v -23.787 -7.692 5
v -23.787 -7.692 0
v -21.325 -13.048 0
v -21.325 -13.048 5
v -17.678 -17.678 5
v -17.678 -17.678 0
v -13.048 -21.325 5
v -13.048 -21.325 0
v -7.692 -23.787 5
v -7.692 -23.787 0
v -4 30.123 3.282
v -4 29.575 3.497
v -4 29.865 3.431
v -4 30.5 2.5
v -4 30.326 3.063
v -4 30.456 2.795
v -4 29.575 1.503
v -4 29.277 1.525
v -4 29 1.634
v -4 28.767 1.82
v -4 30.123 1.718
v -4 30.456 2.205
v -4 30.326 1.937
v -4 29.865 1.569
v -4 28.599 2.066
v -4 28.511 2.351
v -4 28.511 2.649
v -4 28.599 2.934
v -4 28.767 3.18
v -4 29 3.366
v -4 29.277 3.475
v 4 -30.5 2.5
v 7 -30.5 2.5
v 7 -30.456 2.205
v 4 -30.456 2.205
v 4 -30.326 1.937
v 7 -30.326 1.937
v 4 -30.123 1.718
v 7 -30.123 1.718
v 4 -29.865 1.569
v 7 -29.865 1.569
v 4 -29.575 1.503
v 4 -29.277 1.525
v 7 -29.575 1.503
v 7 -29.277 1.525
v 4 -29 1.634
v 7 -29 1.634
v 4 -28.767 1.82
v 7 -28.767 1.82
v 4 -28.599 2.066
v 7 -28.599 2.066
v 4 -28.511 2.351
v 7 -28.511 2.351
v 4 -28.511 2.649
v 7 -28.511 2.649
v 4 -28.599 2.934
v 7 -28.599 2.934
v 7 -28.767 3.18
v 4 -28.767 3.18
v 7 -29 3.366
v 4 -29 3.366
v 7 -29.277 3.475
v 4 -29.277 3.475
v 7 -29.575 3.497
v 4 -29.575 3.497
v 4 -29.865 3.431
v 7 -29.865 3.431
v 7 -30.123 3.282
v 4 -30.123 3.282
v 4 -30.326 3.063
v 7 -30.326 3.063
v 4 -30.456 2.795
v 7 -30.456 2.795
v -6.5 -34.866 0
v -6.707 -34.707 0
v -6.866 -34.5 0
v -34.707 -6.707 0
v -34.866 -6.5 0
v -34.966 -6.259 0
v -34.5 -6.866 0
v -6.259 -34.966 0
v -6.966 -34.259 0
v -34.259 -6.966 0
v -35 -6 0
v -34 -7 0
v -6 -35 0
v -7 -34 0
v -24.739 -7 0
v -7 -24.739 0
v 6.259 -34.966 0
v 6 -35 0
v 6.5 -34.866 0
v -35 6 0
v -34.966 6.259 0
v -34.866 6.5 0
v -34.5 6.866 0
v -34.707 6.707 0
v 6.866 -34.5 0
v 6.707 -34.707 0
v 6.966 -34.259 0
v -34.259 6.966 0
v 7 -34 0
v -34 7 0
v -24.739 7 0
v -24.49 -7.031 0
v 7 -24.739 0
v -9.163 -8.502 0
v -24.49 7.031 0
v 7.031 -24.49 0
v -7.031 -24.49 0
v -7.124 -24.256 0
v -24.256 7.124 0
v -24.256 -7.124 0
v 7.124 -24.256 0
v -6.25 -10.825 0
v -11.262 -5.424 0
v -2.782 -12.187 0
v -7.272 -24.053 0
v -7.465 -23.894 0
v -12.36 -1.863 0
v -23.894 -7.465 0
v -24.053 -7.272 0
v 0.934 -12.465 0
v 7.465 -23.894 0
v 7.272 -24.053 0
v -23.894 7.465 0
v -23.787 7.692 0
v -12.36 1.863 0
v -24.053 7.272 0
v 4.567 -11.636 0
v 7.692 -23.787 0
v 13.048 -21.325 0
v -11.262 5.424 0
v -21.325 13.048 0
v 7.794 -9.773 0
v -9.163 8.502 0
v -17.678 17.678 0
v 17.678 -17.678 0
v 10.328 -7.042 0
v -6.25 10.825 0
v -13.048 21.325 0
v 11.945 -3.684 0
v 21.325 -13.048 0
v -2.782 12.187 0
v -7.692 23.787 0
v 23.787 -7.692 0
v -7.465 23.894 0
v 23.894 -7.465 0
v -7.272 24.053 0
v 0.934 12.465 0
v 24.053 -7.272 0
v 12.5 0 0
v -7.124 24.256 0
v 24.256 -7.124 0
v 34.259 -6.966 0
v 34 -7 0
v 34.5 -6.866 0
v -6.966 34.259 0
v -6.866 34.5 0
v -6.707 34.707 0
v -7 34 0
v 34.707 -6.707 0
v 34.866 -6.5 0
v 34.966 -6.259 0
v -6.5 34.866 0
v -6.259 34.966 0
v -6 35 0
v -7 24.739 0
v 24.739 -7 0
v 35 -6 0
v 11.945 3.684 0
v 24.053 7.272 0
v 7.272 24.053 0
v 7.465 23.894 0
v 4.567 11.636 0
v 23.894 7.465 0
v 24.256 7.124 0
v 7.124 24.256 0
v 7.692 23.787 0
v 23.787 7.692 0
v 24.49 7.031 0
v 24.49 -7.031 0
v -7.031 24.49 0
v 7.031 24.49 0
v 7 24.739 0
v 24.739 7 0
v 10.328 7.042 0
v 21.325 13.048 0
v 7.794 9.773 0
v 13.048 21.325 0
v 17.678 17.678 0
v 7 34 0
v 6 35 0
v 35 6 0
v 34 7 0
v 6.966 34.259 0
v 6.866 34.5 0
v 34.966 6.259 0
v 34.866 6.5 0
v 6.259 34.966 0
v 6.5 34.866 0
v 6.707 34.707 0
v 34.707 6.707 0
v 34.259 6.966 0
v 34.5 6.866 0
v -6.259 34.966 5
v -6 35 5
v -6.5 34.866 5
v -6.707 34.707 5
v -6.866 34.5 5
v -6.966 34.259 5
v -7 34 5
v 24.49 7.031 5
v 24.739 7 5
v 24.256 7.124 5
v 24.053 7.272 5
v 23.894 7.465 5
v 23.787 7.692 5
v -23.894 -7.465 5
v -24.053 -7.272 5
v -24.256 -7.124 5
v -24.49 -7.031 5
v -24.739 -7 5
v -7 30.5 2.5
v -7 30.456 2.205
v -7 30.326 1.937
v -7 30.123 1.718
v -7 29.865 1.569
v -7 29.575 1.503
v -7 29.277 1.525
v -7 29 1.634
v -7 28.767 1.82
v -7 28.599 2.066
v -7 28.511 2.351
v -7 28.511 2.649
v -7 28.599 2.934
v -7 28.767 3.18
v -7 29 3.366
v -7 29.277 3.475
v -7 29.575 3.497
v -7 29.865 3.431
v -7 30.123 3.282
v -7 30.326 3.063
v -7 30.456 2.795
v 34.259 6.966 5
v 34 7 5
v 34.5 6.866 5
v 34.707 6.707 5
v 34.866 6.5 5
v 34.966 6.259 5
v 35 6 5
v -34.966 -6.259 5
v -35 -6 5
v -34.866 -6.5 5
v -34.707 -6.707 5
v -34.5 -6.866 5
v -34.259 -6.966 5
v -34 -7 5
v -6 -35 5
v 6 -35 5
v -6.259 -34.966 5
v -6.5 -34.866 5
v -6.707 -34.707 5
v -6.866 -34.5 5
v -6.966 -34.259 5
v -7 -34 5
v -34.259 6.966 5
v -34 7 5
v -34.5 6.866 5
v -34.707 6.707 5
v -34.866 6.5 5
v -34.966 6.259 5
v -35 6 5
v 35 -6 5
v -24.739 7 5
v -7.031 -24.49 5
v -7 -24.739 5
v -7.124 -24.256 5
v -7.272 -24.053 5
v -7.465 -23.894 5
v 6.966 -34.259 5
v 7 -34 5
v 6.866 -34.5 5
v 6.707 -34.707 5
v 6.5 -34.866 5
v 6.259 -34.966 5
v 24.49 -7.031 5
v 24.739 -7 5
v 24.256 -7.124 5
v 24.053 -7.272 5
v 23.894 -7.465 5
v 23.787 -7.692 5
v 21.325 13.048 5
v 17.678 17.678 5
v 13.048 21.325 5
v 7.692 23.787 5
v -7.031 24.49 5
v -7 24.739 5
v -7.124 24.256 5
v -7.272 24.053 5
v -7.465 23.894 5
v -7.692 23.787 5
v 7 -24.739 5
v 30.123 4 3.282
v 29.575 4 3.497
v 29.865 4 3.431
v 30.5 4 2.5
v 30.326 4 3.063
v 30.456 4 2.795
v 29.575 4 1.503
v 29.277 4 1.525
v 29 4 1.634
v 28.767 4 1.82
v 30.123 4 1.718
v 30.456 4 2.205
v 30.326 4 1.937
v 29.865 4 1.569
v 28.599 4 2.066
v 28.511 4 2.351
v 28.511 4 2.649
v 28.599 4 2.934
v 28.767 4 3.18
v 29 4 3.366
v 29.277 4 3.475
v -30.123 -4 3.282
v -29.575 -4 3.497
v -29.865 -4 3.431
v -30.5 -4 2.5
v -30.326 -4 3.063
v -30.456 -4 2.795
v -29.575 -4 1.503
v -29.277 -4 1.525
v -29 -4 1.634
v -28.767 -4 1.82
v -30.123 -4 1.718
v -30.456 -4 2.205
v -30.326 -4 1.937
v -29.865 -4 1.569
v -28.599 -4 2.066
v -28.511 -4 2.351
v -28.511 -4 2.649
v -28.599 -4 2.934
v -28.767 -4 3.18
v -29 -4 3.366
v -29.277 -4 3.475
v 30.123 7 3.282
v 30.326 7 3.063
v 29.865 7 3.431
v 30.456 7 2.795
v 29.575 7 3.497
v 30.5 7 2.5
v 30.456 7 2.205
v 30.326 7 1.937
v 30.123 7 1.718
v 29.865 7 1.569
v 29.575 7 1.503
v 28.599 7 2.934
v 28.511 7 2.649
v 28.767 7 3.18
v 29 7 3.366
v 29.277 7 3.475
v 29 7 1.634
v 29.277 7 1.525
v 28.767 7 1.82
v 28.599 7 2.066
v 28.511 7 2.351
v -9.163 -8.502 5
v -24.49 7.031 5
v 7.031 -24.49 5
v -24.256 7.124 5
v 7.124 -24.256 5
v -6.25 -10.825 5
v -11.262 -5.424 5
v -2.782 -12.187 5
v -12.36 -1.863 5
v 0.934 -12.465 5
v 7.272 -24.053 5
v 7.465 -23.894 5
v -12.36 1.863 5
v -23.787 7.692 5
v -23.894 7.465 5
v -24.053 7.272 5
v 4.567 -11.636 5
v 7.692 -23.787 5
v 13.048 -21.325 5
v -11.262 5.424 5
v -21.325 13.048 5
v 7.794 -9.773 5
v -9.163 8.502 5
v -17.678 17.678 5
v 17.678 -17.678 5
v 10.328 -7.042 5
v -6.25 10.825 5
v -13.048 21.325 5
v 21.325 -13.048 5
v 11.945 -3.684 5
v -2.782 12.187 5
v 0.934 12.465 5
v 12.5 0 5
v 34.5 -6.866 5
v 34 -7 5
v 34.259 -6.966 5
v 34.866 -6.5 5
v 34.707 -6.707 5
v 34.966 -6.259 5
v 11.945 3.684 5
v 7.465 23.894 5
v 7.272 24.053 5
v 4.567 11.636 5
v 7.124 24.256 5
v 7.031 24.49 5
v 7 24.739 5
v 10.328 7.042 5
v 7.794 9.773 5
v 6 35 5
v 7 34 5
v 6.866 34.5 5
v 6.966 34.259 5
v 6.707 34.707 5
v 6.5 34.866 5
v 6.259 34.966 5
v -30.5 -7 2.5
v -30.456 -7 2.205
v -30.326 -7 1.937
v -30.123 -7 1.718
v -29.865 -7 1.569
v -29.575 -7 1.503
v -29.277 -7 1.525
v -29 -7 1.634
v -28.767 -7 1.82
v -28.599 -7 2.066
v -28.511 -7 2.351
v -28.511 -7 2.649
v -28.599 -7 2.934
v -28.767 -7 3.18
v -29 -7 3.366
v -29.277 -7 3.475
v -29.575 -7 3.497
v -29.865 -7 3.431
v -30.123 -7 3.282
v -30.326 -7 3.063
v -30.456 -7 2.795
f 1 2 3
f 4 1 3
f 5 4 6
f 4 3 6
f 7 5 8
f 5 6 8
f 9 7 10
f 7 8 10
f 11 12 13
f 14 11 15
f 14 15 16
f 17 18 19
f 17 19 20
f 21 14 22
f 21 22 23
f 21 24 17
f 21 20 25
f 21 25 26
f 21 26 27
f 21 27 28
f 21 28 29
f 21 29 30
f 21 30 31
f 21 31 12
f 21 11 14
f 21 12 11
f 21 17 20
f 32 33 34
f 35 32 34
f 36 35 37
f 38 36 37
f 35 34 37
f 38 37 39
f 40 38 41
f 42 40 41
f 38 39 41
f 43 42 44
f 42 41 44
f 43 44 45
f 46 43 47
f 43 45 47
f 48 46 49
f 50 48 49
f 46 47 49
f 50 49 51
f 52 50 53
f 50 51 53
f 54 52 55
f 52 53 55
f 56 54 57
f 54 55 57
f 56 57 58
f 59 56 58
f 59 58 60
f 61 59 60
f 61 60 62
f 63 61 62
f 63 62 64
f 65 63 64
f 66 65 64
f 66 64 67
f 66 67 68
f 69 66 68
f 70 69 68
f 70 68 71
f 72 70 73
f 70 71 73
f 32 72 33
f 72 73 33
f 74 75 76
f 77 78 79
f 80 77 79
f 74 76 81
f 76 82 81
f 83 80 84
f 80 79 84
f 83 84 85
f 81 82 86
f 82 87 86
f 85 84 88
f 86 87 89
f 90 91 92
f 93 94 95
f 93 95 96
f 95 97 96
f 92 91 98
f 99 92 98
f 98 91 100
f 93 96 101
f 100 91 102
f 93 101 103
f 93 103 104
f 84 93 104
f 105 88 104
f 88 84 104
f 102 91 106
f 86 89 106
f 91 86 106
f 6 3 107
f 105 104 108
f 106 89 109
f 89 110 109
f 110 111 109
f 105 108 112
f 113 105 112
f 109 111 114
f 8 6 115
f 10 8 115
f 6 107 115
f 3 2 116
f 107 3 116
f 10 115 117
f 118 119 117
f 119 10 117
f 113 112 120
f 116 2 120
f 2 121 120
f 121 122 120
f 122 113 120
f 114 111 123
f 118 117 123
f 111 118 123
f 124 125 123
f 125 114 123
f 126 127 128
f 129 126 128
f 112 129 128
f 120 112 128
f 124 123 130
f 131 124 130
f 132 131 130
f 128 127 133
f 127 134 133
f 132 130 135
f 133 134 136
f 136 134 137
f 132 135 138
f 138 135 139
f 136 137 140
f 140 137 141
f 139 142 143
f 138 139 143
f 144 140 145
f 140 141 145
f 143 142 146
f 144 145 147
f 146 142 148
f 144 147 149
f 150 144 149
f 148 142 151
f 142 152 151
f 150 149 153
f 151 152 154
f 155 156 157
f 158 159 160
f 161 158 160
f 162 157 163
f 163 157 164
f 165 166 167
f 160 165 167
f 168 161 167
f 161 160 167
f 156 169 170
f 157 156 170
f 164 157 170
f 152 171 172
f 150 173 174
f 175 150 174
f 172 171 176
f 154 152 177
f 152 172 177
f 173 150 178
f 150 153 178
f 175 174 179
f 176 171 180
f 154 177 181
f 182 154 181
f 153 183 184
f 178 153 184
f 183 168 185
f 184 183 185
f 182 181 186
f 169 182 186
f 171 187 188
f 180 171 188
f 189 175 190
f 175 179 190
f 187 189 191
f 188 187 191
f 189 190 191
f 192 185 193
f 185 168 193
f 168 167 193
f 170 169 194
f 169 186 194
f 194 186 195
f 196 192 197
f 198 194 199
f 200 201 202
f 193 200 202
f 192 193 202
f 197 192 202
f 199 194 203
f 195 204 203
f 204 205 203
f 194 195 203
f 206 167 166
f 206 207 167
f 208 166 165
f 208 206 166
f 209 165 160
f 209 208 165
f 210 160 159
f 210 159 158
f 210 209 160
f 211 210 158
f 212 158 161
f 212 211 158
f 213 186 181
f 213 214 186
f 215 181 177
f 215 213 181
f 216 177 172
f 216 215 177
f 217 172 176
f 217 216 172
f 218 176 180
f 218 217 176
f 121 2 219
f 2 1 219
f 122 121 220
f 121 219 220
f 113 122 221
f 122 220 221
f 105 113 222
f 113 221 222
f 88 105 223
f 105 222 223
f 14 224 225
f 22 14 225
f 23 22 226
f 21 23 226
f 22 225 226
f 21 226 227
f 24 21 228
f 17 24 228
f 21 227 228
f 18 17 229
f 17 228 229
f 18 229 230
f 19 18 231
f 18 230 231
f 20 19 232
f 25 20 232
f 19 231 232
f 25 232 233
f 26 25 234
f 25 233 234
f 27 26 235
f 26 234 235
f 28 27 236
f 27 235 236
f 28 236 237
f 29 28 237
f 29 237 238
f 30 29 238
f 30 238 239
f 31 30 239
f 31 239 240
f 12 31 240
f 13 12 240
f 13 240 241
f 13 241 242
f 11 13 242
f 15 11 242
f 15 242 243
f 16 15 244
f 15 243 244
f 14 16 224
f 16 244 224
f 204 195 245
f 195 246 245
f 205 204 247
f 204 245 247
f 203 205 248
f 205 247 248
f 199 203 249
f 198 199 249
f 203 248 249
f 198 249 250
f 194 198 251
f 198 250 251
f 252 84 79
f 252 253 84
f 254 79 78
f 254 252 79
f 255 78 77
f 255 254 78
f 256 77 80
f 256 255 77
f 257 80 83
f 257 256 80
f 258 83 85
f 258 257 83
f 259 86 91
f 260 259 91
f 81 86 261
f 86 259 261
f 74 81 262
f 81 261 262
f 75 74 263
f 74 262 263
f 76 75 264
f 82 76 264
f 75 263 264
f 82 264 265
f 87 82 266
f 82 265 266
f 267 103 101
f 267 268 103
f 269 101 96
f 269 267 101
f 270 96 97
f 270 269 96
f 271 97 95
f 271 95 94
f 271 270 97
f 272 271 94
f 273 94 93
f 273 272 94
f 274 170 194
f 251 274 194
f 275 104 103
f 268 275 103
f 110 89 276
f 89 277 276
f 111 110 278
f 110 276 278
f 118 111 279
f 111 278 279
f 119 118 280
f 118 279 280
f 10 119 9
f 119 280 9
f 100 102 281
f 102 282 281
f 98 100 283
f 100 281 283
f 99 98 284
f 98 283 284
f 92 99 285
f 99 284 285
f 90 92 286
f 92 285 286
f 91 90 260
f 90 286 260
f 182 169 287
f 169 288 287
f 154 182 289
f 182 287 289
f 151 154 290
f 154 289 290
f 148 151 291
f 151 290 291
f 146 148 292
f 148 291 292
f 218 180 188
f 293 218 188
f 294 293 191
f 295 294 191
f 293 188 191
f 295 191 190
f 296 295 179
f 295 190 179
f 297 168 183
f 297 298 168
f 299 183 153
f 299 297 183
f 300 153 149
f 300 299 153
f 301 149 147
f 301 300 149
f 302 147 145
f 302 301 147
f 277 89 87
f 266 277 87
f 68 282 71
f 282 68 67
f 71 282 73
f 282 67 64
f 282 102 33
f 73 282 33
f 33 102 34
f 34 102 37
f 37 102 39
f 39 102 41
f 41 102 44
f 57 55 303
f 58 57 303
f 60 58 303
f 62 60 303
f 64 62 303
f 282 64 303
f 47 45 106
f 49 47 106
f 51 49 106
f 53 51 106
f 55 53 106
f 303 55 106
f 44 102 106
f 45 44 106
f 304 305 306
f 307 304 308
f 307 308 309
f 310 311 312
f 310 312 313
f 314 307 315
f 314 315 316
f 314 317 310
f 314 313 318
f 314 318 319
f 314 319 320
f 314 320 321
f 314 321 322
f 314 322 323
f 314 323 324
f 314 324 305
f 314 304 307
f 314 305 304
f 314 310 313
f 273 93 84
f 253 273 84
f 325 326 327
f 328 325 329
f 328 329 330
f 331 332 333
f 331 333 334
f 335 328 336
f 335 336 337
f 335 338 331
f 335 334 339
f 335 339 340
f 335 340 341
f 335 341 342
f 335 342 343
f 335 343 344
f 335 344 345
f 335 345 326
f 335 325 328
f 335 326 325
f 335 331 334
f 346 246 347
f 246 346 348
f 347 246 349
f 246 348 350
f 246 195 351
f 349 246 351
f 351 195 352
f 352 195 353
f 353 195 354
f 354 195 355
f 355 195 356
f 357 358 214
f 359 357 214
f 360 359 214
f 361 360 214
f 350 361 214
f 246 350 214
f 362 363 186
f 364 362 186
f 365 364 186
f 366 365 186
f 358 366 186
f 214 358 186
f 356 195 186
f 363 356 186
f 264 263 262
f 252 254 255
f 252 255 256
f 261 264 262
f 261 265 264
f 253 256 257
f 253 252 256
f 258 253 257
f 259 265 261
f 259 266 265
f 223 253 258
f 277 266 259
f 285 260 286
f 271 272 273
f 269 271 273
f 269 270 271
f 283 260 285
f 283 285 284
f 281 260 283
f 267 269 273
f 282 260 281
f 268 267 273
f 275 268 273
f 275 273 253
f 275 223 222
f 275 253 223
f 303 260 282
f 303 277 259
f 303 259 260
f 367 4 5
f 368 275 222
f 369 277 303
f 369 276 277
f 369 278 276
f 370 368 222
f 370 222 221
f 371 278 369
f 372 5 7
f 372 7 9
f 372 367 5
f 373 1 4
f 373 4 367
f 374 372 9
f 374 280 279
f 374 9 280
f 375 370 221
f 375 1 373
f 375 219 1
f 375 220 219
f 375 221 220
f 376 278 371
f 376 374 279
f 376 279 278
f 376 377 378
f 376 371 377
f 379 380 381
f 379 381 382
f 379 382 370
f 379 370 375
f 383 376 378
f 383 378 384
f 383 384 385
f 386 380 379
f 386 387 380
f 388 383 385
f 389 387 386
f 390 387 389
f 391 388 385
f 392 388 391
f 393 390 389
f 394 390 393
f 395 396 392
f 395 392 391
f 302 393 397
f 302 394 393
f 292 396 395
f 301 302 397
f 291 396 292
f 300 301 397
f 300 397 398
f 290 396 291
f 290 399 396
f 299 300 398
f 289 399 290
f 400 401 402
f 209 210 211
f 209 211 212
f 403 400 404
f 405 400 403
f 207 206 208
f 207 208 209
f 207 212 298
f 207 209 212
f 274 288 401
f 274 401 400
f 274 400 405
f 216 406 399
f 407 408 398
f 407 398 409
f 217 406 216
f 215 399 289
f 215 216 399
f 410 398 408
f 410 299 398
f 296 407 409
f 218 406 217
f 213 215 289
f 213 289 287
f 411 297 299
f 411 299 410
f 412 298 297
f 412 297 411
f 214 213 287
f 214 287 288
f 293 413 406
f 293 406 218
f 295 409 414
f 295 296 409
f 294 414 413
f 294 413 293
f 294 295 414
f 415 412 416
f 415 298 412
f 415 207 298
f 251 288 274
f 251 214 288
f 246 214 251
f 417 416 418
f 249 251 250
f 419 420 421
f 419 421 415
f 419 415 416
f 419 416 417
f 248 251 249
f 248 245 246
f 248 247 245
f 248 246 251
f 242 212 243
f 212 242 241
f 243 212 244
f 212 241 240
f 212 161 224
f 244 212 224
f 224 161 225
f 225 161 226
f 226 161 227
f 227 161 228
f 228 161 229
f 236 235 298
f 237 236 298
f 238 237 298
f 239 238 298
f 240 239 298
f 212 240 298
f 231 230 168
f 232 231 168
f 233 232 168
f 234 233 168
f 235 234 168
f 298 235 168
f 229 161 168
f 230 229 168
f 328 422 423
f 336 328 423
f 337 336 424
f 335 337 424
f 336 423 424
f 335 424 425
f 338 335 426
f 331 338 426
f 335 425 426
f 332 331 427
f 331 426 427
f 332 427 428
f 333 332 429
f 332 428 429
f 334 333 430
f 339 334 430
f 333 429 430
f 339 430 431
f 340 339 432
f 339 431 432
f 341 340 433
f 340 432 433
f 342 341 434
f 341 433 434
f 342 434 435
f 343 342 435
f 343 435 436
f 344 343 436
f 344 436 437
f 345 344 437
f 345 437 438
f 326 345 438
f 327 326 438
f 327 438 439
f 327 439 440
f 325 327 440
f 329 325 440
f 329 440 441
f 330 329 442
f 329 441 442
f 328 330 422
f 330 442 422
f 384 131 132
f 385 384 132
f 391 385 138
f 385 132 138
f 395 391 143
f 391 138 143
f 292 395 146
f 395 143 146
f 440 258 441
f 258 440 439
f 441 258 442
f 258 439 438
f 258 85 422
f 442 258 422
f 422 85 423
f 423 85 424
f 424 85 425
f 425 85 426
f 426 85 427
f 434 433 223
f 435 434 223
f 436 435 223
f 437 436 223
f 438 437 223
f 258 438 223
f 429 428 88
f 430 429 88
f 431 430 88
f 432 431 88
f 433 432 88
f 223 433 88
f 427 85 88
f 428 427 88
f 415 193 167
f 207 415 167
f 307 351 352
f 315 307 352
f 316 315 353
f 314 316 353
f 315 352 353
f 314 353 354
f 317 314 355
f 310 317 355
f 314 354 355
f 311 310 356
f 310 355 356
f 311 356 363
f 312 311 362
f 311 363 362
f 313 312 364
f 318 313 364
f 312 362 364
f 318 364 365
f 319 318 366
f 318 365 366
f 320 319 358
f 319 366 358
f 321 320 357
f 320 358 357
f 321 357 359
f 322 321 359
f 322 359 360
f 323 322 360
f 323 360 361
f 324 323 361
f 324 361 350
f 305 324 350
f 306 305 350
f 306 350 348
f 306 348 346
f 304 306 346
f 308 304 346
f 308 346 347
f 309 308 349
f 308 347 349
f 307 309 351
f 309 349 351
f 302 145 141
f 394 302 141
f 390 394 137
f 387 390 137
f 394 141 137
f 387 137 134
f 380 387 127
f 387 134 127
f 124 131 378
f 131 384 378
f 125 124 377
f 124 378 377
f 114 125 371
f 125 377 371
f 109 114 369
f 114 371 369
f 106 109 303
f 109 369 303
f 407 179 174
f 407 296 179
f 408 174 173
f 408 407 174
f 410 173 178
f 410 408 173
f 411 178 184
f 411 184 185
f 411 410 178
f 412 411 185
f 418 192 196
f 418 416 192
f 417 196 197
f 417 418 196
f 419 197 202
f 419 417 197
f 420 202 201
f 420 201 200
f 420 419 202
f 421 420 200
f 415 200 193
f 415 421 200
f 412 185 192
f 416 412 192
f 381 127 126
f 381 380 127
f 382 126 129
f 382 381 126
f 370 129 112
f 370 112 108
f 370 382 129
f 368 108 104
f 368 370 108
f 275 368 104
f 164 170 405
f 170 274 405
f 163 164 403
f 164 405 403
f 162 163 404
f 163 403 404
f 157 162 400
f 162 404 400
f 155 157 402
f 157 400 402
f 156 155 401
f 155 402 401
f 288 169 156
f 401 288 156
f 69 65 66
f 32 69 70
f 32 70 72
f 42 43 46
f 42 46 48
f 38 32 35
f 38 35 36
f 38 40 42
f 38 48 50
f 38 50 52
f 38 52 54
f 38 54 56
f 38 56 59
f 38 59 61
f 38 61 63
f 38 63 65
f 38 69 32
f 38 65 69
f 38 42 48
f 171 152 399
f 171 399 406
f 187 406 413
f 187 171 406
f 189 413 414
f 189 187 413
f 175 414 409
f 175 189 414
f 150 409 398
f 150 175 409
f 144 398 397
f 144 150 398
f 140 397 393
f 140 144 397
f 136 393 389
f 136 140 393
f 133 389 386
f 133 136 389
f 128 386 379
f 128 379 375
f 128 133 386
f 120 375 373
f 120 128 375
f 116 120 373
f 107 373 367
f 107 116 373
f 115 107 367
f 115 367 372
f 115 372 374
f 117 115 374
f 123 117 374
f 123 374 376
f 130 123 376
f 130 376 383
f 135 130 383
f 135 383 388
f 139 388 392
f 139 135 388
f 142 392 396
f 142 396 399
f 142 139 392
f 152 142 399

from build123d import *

# Parameters (mm, degrees)
SKETCH1_R           = 12.5
BOSS_EXTRUDE1_DEPTH = 5
SKETCH2_R           = 1
CUT_EXTRUDE1_DEPTH  = 3
CIRPATTERN1_COUNT   = 4
FILLET1_R           = 1
FILLET2_R           = 1


with BuildPart() as part:
    # Sketch1 → Boss-Extrude1 (new body)
    with BuildSketch(Plane.XY):
        with BuildLine():
            Line((35, 7), (24, 7))
            ThreePointArc((24, 7), (17.67766953, 17.67766953), (7, 24))
            Line((7, 24), (7, 35))
            Line((7, 35), (-7, 35))
            Line((-7, 35), (-7, 24))
            ThreePointArc((-7, 24), (-17.67766953, 17.67766953), (-24, 7))
            Line((-24, 7), (-35, 7))
            Line((-35, 7), (-35, -7))
            Line((-35, -7), (-24, -7))
            ThreePointArc((-24, -7), (-17.67766953, -17.67766953), (-7, -24))
            Line((-7, -24), (-7, -35))
            Line((-7, -35), (7, -35))
            Line((7, -35), (7, -24))
            ThreePointArc((7, -24), (17.67766953, -17.67766953), (24, -7))
            Line((24, -7), (35, -7))
            Line((35, -7), (35, 7))
        make_face()
        Circle(SKETCH1_R, mode=Mode.SUBTRACT)
    extrude(amount=BOSS_EXTRUDE1_DEPTH)

    # Sketch2 → Cut-Extrude1 (cut)
    with BuildSketch(Plane(origin=(0, 7, 0), x_dir=(1, 0, 0), z_dir=(0, 1, 0))):
        with Locations((29.5, -2.5)):
            Circle(SKETCH2_R)
    cut_extrude1 = extrude(amount=-CUT_EXTRUDE1_DEPTH, mode=Mode.SUBTRACT)

    # CirPattern1: Cut-Extrude1 ×4 about axis
    cirpattern1_axis = Axis((0, 0, 0), (0, 0, 1))
    for i in range(1, CIRPATTERN1_COUNT):
        add(cut_extrude1.rotate(cirpattern1_axis, i * 360 / CIRPATTERN1_COUNT), mode=Mode.SUBTRACT)

    # Fillet1
    fillet1_edges = [part.edges().sort_by_distance(p)[0] for p in [
        (35, 7, 2.5),
        (35, -7, 2.5),
        (7, -35, 2.5),
        (-7, -35, 2.5),
        (-35, -7, 2.5),
        (-35, 7, 2.5),
        (-7, 35, 2.5),
        (7, 35, 2.5),
    ]]
    fillet(fillet1_edges, radius=FILLET1_R)

    # Fillet2
    fillet2_edges = [part.edges().sort_by_distance(p)[0] for p in [
        (24, 7, 2.5),
        (24, -7, 2.5),
        (7, -24, 2.5),
        (-7, -24, 2.5),
        (-24, -7, 2.5),
        (-24, 7, 2.5),
        (-7, 24, 2.5),
        (7, 24, 2.5),
    ]]
    fillet(fillet2_edges, radius=FILLET2_R)


solid = part.part
